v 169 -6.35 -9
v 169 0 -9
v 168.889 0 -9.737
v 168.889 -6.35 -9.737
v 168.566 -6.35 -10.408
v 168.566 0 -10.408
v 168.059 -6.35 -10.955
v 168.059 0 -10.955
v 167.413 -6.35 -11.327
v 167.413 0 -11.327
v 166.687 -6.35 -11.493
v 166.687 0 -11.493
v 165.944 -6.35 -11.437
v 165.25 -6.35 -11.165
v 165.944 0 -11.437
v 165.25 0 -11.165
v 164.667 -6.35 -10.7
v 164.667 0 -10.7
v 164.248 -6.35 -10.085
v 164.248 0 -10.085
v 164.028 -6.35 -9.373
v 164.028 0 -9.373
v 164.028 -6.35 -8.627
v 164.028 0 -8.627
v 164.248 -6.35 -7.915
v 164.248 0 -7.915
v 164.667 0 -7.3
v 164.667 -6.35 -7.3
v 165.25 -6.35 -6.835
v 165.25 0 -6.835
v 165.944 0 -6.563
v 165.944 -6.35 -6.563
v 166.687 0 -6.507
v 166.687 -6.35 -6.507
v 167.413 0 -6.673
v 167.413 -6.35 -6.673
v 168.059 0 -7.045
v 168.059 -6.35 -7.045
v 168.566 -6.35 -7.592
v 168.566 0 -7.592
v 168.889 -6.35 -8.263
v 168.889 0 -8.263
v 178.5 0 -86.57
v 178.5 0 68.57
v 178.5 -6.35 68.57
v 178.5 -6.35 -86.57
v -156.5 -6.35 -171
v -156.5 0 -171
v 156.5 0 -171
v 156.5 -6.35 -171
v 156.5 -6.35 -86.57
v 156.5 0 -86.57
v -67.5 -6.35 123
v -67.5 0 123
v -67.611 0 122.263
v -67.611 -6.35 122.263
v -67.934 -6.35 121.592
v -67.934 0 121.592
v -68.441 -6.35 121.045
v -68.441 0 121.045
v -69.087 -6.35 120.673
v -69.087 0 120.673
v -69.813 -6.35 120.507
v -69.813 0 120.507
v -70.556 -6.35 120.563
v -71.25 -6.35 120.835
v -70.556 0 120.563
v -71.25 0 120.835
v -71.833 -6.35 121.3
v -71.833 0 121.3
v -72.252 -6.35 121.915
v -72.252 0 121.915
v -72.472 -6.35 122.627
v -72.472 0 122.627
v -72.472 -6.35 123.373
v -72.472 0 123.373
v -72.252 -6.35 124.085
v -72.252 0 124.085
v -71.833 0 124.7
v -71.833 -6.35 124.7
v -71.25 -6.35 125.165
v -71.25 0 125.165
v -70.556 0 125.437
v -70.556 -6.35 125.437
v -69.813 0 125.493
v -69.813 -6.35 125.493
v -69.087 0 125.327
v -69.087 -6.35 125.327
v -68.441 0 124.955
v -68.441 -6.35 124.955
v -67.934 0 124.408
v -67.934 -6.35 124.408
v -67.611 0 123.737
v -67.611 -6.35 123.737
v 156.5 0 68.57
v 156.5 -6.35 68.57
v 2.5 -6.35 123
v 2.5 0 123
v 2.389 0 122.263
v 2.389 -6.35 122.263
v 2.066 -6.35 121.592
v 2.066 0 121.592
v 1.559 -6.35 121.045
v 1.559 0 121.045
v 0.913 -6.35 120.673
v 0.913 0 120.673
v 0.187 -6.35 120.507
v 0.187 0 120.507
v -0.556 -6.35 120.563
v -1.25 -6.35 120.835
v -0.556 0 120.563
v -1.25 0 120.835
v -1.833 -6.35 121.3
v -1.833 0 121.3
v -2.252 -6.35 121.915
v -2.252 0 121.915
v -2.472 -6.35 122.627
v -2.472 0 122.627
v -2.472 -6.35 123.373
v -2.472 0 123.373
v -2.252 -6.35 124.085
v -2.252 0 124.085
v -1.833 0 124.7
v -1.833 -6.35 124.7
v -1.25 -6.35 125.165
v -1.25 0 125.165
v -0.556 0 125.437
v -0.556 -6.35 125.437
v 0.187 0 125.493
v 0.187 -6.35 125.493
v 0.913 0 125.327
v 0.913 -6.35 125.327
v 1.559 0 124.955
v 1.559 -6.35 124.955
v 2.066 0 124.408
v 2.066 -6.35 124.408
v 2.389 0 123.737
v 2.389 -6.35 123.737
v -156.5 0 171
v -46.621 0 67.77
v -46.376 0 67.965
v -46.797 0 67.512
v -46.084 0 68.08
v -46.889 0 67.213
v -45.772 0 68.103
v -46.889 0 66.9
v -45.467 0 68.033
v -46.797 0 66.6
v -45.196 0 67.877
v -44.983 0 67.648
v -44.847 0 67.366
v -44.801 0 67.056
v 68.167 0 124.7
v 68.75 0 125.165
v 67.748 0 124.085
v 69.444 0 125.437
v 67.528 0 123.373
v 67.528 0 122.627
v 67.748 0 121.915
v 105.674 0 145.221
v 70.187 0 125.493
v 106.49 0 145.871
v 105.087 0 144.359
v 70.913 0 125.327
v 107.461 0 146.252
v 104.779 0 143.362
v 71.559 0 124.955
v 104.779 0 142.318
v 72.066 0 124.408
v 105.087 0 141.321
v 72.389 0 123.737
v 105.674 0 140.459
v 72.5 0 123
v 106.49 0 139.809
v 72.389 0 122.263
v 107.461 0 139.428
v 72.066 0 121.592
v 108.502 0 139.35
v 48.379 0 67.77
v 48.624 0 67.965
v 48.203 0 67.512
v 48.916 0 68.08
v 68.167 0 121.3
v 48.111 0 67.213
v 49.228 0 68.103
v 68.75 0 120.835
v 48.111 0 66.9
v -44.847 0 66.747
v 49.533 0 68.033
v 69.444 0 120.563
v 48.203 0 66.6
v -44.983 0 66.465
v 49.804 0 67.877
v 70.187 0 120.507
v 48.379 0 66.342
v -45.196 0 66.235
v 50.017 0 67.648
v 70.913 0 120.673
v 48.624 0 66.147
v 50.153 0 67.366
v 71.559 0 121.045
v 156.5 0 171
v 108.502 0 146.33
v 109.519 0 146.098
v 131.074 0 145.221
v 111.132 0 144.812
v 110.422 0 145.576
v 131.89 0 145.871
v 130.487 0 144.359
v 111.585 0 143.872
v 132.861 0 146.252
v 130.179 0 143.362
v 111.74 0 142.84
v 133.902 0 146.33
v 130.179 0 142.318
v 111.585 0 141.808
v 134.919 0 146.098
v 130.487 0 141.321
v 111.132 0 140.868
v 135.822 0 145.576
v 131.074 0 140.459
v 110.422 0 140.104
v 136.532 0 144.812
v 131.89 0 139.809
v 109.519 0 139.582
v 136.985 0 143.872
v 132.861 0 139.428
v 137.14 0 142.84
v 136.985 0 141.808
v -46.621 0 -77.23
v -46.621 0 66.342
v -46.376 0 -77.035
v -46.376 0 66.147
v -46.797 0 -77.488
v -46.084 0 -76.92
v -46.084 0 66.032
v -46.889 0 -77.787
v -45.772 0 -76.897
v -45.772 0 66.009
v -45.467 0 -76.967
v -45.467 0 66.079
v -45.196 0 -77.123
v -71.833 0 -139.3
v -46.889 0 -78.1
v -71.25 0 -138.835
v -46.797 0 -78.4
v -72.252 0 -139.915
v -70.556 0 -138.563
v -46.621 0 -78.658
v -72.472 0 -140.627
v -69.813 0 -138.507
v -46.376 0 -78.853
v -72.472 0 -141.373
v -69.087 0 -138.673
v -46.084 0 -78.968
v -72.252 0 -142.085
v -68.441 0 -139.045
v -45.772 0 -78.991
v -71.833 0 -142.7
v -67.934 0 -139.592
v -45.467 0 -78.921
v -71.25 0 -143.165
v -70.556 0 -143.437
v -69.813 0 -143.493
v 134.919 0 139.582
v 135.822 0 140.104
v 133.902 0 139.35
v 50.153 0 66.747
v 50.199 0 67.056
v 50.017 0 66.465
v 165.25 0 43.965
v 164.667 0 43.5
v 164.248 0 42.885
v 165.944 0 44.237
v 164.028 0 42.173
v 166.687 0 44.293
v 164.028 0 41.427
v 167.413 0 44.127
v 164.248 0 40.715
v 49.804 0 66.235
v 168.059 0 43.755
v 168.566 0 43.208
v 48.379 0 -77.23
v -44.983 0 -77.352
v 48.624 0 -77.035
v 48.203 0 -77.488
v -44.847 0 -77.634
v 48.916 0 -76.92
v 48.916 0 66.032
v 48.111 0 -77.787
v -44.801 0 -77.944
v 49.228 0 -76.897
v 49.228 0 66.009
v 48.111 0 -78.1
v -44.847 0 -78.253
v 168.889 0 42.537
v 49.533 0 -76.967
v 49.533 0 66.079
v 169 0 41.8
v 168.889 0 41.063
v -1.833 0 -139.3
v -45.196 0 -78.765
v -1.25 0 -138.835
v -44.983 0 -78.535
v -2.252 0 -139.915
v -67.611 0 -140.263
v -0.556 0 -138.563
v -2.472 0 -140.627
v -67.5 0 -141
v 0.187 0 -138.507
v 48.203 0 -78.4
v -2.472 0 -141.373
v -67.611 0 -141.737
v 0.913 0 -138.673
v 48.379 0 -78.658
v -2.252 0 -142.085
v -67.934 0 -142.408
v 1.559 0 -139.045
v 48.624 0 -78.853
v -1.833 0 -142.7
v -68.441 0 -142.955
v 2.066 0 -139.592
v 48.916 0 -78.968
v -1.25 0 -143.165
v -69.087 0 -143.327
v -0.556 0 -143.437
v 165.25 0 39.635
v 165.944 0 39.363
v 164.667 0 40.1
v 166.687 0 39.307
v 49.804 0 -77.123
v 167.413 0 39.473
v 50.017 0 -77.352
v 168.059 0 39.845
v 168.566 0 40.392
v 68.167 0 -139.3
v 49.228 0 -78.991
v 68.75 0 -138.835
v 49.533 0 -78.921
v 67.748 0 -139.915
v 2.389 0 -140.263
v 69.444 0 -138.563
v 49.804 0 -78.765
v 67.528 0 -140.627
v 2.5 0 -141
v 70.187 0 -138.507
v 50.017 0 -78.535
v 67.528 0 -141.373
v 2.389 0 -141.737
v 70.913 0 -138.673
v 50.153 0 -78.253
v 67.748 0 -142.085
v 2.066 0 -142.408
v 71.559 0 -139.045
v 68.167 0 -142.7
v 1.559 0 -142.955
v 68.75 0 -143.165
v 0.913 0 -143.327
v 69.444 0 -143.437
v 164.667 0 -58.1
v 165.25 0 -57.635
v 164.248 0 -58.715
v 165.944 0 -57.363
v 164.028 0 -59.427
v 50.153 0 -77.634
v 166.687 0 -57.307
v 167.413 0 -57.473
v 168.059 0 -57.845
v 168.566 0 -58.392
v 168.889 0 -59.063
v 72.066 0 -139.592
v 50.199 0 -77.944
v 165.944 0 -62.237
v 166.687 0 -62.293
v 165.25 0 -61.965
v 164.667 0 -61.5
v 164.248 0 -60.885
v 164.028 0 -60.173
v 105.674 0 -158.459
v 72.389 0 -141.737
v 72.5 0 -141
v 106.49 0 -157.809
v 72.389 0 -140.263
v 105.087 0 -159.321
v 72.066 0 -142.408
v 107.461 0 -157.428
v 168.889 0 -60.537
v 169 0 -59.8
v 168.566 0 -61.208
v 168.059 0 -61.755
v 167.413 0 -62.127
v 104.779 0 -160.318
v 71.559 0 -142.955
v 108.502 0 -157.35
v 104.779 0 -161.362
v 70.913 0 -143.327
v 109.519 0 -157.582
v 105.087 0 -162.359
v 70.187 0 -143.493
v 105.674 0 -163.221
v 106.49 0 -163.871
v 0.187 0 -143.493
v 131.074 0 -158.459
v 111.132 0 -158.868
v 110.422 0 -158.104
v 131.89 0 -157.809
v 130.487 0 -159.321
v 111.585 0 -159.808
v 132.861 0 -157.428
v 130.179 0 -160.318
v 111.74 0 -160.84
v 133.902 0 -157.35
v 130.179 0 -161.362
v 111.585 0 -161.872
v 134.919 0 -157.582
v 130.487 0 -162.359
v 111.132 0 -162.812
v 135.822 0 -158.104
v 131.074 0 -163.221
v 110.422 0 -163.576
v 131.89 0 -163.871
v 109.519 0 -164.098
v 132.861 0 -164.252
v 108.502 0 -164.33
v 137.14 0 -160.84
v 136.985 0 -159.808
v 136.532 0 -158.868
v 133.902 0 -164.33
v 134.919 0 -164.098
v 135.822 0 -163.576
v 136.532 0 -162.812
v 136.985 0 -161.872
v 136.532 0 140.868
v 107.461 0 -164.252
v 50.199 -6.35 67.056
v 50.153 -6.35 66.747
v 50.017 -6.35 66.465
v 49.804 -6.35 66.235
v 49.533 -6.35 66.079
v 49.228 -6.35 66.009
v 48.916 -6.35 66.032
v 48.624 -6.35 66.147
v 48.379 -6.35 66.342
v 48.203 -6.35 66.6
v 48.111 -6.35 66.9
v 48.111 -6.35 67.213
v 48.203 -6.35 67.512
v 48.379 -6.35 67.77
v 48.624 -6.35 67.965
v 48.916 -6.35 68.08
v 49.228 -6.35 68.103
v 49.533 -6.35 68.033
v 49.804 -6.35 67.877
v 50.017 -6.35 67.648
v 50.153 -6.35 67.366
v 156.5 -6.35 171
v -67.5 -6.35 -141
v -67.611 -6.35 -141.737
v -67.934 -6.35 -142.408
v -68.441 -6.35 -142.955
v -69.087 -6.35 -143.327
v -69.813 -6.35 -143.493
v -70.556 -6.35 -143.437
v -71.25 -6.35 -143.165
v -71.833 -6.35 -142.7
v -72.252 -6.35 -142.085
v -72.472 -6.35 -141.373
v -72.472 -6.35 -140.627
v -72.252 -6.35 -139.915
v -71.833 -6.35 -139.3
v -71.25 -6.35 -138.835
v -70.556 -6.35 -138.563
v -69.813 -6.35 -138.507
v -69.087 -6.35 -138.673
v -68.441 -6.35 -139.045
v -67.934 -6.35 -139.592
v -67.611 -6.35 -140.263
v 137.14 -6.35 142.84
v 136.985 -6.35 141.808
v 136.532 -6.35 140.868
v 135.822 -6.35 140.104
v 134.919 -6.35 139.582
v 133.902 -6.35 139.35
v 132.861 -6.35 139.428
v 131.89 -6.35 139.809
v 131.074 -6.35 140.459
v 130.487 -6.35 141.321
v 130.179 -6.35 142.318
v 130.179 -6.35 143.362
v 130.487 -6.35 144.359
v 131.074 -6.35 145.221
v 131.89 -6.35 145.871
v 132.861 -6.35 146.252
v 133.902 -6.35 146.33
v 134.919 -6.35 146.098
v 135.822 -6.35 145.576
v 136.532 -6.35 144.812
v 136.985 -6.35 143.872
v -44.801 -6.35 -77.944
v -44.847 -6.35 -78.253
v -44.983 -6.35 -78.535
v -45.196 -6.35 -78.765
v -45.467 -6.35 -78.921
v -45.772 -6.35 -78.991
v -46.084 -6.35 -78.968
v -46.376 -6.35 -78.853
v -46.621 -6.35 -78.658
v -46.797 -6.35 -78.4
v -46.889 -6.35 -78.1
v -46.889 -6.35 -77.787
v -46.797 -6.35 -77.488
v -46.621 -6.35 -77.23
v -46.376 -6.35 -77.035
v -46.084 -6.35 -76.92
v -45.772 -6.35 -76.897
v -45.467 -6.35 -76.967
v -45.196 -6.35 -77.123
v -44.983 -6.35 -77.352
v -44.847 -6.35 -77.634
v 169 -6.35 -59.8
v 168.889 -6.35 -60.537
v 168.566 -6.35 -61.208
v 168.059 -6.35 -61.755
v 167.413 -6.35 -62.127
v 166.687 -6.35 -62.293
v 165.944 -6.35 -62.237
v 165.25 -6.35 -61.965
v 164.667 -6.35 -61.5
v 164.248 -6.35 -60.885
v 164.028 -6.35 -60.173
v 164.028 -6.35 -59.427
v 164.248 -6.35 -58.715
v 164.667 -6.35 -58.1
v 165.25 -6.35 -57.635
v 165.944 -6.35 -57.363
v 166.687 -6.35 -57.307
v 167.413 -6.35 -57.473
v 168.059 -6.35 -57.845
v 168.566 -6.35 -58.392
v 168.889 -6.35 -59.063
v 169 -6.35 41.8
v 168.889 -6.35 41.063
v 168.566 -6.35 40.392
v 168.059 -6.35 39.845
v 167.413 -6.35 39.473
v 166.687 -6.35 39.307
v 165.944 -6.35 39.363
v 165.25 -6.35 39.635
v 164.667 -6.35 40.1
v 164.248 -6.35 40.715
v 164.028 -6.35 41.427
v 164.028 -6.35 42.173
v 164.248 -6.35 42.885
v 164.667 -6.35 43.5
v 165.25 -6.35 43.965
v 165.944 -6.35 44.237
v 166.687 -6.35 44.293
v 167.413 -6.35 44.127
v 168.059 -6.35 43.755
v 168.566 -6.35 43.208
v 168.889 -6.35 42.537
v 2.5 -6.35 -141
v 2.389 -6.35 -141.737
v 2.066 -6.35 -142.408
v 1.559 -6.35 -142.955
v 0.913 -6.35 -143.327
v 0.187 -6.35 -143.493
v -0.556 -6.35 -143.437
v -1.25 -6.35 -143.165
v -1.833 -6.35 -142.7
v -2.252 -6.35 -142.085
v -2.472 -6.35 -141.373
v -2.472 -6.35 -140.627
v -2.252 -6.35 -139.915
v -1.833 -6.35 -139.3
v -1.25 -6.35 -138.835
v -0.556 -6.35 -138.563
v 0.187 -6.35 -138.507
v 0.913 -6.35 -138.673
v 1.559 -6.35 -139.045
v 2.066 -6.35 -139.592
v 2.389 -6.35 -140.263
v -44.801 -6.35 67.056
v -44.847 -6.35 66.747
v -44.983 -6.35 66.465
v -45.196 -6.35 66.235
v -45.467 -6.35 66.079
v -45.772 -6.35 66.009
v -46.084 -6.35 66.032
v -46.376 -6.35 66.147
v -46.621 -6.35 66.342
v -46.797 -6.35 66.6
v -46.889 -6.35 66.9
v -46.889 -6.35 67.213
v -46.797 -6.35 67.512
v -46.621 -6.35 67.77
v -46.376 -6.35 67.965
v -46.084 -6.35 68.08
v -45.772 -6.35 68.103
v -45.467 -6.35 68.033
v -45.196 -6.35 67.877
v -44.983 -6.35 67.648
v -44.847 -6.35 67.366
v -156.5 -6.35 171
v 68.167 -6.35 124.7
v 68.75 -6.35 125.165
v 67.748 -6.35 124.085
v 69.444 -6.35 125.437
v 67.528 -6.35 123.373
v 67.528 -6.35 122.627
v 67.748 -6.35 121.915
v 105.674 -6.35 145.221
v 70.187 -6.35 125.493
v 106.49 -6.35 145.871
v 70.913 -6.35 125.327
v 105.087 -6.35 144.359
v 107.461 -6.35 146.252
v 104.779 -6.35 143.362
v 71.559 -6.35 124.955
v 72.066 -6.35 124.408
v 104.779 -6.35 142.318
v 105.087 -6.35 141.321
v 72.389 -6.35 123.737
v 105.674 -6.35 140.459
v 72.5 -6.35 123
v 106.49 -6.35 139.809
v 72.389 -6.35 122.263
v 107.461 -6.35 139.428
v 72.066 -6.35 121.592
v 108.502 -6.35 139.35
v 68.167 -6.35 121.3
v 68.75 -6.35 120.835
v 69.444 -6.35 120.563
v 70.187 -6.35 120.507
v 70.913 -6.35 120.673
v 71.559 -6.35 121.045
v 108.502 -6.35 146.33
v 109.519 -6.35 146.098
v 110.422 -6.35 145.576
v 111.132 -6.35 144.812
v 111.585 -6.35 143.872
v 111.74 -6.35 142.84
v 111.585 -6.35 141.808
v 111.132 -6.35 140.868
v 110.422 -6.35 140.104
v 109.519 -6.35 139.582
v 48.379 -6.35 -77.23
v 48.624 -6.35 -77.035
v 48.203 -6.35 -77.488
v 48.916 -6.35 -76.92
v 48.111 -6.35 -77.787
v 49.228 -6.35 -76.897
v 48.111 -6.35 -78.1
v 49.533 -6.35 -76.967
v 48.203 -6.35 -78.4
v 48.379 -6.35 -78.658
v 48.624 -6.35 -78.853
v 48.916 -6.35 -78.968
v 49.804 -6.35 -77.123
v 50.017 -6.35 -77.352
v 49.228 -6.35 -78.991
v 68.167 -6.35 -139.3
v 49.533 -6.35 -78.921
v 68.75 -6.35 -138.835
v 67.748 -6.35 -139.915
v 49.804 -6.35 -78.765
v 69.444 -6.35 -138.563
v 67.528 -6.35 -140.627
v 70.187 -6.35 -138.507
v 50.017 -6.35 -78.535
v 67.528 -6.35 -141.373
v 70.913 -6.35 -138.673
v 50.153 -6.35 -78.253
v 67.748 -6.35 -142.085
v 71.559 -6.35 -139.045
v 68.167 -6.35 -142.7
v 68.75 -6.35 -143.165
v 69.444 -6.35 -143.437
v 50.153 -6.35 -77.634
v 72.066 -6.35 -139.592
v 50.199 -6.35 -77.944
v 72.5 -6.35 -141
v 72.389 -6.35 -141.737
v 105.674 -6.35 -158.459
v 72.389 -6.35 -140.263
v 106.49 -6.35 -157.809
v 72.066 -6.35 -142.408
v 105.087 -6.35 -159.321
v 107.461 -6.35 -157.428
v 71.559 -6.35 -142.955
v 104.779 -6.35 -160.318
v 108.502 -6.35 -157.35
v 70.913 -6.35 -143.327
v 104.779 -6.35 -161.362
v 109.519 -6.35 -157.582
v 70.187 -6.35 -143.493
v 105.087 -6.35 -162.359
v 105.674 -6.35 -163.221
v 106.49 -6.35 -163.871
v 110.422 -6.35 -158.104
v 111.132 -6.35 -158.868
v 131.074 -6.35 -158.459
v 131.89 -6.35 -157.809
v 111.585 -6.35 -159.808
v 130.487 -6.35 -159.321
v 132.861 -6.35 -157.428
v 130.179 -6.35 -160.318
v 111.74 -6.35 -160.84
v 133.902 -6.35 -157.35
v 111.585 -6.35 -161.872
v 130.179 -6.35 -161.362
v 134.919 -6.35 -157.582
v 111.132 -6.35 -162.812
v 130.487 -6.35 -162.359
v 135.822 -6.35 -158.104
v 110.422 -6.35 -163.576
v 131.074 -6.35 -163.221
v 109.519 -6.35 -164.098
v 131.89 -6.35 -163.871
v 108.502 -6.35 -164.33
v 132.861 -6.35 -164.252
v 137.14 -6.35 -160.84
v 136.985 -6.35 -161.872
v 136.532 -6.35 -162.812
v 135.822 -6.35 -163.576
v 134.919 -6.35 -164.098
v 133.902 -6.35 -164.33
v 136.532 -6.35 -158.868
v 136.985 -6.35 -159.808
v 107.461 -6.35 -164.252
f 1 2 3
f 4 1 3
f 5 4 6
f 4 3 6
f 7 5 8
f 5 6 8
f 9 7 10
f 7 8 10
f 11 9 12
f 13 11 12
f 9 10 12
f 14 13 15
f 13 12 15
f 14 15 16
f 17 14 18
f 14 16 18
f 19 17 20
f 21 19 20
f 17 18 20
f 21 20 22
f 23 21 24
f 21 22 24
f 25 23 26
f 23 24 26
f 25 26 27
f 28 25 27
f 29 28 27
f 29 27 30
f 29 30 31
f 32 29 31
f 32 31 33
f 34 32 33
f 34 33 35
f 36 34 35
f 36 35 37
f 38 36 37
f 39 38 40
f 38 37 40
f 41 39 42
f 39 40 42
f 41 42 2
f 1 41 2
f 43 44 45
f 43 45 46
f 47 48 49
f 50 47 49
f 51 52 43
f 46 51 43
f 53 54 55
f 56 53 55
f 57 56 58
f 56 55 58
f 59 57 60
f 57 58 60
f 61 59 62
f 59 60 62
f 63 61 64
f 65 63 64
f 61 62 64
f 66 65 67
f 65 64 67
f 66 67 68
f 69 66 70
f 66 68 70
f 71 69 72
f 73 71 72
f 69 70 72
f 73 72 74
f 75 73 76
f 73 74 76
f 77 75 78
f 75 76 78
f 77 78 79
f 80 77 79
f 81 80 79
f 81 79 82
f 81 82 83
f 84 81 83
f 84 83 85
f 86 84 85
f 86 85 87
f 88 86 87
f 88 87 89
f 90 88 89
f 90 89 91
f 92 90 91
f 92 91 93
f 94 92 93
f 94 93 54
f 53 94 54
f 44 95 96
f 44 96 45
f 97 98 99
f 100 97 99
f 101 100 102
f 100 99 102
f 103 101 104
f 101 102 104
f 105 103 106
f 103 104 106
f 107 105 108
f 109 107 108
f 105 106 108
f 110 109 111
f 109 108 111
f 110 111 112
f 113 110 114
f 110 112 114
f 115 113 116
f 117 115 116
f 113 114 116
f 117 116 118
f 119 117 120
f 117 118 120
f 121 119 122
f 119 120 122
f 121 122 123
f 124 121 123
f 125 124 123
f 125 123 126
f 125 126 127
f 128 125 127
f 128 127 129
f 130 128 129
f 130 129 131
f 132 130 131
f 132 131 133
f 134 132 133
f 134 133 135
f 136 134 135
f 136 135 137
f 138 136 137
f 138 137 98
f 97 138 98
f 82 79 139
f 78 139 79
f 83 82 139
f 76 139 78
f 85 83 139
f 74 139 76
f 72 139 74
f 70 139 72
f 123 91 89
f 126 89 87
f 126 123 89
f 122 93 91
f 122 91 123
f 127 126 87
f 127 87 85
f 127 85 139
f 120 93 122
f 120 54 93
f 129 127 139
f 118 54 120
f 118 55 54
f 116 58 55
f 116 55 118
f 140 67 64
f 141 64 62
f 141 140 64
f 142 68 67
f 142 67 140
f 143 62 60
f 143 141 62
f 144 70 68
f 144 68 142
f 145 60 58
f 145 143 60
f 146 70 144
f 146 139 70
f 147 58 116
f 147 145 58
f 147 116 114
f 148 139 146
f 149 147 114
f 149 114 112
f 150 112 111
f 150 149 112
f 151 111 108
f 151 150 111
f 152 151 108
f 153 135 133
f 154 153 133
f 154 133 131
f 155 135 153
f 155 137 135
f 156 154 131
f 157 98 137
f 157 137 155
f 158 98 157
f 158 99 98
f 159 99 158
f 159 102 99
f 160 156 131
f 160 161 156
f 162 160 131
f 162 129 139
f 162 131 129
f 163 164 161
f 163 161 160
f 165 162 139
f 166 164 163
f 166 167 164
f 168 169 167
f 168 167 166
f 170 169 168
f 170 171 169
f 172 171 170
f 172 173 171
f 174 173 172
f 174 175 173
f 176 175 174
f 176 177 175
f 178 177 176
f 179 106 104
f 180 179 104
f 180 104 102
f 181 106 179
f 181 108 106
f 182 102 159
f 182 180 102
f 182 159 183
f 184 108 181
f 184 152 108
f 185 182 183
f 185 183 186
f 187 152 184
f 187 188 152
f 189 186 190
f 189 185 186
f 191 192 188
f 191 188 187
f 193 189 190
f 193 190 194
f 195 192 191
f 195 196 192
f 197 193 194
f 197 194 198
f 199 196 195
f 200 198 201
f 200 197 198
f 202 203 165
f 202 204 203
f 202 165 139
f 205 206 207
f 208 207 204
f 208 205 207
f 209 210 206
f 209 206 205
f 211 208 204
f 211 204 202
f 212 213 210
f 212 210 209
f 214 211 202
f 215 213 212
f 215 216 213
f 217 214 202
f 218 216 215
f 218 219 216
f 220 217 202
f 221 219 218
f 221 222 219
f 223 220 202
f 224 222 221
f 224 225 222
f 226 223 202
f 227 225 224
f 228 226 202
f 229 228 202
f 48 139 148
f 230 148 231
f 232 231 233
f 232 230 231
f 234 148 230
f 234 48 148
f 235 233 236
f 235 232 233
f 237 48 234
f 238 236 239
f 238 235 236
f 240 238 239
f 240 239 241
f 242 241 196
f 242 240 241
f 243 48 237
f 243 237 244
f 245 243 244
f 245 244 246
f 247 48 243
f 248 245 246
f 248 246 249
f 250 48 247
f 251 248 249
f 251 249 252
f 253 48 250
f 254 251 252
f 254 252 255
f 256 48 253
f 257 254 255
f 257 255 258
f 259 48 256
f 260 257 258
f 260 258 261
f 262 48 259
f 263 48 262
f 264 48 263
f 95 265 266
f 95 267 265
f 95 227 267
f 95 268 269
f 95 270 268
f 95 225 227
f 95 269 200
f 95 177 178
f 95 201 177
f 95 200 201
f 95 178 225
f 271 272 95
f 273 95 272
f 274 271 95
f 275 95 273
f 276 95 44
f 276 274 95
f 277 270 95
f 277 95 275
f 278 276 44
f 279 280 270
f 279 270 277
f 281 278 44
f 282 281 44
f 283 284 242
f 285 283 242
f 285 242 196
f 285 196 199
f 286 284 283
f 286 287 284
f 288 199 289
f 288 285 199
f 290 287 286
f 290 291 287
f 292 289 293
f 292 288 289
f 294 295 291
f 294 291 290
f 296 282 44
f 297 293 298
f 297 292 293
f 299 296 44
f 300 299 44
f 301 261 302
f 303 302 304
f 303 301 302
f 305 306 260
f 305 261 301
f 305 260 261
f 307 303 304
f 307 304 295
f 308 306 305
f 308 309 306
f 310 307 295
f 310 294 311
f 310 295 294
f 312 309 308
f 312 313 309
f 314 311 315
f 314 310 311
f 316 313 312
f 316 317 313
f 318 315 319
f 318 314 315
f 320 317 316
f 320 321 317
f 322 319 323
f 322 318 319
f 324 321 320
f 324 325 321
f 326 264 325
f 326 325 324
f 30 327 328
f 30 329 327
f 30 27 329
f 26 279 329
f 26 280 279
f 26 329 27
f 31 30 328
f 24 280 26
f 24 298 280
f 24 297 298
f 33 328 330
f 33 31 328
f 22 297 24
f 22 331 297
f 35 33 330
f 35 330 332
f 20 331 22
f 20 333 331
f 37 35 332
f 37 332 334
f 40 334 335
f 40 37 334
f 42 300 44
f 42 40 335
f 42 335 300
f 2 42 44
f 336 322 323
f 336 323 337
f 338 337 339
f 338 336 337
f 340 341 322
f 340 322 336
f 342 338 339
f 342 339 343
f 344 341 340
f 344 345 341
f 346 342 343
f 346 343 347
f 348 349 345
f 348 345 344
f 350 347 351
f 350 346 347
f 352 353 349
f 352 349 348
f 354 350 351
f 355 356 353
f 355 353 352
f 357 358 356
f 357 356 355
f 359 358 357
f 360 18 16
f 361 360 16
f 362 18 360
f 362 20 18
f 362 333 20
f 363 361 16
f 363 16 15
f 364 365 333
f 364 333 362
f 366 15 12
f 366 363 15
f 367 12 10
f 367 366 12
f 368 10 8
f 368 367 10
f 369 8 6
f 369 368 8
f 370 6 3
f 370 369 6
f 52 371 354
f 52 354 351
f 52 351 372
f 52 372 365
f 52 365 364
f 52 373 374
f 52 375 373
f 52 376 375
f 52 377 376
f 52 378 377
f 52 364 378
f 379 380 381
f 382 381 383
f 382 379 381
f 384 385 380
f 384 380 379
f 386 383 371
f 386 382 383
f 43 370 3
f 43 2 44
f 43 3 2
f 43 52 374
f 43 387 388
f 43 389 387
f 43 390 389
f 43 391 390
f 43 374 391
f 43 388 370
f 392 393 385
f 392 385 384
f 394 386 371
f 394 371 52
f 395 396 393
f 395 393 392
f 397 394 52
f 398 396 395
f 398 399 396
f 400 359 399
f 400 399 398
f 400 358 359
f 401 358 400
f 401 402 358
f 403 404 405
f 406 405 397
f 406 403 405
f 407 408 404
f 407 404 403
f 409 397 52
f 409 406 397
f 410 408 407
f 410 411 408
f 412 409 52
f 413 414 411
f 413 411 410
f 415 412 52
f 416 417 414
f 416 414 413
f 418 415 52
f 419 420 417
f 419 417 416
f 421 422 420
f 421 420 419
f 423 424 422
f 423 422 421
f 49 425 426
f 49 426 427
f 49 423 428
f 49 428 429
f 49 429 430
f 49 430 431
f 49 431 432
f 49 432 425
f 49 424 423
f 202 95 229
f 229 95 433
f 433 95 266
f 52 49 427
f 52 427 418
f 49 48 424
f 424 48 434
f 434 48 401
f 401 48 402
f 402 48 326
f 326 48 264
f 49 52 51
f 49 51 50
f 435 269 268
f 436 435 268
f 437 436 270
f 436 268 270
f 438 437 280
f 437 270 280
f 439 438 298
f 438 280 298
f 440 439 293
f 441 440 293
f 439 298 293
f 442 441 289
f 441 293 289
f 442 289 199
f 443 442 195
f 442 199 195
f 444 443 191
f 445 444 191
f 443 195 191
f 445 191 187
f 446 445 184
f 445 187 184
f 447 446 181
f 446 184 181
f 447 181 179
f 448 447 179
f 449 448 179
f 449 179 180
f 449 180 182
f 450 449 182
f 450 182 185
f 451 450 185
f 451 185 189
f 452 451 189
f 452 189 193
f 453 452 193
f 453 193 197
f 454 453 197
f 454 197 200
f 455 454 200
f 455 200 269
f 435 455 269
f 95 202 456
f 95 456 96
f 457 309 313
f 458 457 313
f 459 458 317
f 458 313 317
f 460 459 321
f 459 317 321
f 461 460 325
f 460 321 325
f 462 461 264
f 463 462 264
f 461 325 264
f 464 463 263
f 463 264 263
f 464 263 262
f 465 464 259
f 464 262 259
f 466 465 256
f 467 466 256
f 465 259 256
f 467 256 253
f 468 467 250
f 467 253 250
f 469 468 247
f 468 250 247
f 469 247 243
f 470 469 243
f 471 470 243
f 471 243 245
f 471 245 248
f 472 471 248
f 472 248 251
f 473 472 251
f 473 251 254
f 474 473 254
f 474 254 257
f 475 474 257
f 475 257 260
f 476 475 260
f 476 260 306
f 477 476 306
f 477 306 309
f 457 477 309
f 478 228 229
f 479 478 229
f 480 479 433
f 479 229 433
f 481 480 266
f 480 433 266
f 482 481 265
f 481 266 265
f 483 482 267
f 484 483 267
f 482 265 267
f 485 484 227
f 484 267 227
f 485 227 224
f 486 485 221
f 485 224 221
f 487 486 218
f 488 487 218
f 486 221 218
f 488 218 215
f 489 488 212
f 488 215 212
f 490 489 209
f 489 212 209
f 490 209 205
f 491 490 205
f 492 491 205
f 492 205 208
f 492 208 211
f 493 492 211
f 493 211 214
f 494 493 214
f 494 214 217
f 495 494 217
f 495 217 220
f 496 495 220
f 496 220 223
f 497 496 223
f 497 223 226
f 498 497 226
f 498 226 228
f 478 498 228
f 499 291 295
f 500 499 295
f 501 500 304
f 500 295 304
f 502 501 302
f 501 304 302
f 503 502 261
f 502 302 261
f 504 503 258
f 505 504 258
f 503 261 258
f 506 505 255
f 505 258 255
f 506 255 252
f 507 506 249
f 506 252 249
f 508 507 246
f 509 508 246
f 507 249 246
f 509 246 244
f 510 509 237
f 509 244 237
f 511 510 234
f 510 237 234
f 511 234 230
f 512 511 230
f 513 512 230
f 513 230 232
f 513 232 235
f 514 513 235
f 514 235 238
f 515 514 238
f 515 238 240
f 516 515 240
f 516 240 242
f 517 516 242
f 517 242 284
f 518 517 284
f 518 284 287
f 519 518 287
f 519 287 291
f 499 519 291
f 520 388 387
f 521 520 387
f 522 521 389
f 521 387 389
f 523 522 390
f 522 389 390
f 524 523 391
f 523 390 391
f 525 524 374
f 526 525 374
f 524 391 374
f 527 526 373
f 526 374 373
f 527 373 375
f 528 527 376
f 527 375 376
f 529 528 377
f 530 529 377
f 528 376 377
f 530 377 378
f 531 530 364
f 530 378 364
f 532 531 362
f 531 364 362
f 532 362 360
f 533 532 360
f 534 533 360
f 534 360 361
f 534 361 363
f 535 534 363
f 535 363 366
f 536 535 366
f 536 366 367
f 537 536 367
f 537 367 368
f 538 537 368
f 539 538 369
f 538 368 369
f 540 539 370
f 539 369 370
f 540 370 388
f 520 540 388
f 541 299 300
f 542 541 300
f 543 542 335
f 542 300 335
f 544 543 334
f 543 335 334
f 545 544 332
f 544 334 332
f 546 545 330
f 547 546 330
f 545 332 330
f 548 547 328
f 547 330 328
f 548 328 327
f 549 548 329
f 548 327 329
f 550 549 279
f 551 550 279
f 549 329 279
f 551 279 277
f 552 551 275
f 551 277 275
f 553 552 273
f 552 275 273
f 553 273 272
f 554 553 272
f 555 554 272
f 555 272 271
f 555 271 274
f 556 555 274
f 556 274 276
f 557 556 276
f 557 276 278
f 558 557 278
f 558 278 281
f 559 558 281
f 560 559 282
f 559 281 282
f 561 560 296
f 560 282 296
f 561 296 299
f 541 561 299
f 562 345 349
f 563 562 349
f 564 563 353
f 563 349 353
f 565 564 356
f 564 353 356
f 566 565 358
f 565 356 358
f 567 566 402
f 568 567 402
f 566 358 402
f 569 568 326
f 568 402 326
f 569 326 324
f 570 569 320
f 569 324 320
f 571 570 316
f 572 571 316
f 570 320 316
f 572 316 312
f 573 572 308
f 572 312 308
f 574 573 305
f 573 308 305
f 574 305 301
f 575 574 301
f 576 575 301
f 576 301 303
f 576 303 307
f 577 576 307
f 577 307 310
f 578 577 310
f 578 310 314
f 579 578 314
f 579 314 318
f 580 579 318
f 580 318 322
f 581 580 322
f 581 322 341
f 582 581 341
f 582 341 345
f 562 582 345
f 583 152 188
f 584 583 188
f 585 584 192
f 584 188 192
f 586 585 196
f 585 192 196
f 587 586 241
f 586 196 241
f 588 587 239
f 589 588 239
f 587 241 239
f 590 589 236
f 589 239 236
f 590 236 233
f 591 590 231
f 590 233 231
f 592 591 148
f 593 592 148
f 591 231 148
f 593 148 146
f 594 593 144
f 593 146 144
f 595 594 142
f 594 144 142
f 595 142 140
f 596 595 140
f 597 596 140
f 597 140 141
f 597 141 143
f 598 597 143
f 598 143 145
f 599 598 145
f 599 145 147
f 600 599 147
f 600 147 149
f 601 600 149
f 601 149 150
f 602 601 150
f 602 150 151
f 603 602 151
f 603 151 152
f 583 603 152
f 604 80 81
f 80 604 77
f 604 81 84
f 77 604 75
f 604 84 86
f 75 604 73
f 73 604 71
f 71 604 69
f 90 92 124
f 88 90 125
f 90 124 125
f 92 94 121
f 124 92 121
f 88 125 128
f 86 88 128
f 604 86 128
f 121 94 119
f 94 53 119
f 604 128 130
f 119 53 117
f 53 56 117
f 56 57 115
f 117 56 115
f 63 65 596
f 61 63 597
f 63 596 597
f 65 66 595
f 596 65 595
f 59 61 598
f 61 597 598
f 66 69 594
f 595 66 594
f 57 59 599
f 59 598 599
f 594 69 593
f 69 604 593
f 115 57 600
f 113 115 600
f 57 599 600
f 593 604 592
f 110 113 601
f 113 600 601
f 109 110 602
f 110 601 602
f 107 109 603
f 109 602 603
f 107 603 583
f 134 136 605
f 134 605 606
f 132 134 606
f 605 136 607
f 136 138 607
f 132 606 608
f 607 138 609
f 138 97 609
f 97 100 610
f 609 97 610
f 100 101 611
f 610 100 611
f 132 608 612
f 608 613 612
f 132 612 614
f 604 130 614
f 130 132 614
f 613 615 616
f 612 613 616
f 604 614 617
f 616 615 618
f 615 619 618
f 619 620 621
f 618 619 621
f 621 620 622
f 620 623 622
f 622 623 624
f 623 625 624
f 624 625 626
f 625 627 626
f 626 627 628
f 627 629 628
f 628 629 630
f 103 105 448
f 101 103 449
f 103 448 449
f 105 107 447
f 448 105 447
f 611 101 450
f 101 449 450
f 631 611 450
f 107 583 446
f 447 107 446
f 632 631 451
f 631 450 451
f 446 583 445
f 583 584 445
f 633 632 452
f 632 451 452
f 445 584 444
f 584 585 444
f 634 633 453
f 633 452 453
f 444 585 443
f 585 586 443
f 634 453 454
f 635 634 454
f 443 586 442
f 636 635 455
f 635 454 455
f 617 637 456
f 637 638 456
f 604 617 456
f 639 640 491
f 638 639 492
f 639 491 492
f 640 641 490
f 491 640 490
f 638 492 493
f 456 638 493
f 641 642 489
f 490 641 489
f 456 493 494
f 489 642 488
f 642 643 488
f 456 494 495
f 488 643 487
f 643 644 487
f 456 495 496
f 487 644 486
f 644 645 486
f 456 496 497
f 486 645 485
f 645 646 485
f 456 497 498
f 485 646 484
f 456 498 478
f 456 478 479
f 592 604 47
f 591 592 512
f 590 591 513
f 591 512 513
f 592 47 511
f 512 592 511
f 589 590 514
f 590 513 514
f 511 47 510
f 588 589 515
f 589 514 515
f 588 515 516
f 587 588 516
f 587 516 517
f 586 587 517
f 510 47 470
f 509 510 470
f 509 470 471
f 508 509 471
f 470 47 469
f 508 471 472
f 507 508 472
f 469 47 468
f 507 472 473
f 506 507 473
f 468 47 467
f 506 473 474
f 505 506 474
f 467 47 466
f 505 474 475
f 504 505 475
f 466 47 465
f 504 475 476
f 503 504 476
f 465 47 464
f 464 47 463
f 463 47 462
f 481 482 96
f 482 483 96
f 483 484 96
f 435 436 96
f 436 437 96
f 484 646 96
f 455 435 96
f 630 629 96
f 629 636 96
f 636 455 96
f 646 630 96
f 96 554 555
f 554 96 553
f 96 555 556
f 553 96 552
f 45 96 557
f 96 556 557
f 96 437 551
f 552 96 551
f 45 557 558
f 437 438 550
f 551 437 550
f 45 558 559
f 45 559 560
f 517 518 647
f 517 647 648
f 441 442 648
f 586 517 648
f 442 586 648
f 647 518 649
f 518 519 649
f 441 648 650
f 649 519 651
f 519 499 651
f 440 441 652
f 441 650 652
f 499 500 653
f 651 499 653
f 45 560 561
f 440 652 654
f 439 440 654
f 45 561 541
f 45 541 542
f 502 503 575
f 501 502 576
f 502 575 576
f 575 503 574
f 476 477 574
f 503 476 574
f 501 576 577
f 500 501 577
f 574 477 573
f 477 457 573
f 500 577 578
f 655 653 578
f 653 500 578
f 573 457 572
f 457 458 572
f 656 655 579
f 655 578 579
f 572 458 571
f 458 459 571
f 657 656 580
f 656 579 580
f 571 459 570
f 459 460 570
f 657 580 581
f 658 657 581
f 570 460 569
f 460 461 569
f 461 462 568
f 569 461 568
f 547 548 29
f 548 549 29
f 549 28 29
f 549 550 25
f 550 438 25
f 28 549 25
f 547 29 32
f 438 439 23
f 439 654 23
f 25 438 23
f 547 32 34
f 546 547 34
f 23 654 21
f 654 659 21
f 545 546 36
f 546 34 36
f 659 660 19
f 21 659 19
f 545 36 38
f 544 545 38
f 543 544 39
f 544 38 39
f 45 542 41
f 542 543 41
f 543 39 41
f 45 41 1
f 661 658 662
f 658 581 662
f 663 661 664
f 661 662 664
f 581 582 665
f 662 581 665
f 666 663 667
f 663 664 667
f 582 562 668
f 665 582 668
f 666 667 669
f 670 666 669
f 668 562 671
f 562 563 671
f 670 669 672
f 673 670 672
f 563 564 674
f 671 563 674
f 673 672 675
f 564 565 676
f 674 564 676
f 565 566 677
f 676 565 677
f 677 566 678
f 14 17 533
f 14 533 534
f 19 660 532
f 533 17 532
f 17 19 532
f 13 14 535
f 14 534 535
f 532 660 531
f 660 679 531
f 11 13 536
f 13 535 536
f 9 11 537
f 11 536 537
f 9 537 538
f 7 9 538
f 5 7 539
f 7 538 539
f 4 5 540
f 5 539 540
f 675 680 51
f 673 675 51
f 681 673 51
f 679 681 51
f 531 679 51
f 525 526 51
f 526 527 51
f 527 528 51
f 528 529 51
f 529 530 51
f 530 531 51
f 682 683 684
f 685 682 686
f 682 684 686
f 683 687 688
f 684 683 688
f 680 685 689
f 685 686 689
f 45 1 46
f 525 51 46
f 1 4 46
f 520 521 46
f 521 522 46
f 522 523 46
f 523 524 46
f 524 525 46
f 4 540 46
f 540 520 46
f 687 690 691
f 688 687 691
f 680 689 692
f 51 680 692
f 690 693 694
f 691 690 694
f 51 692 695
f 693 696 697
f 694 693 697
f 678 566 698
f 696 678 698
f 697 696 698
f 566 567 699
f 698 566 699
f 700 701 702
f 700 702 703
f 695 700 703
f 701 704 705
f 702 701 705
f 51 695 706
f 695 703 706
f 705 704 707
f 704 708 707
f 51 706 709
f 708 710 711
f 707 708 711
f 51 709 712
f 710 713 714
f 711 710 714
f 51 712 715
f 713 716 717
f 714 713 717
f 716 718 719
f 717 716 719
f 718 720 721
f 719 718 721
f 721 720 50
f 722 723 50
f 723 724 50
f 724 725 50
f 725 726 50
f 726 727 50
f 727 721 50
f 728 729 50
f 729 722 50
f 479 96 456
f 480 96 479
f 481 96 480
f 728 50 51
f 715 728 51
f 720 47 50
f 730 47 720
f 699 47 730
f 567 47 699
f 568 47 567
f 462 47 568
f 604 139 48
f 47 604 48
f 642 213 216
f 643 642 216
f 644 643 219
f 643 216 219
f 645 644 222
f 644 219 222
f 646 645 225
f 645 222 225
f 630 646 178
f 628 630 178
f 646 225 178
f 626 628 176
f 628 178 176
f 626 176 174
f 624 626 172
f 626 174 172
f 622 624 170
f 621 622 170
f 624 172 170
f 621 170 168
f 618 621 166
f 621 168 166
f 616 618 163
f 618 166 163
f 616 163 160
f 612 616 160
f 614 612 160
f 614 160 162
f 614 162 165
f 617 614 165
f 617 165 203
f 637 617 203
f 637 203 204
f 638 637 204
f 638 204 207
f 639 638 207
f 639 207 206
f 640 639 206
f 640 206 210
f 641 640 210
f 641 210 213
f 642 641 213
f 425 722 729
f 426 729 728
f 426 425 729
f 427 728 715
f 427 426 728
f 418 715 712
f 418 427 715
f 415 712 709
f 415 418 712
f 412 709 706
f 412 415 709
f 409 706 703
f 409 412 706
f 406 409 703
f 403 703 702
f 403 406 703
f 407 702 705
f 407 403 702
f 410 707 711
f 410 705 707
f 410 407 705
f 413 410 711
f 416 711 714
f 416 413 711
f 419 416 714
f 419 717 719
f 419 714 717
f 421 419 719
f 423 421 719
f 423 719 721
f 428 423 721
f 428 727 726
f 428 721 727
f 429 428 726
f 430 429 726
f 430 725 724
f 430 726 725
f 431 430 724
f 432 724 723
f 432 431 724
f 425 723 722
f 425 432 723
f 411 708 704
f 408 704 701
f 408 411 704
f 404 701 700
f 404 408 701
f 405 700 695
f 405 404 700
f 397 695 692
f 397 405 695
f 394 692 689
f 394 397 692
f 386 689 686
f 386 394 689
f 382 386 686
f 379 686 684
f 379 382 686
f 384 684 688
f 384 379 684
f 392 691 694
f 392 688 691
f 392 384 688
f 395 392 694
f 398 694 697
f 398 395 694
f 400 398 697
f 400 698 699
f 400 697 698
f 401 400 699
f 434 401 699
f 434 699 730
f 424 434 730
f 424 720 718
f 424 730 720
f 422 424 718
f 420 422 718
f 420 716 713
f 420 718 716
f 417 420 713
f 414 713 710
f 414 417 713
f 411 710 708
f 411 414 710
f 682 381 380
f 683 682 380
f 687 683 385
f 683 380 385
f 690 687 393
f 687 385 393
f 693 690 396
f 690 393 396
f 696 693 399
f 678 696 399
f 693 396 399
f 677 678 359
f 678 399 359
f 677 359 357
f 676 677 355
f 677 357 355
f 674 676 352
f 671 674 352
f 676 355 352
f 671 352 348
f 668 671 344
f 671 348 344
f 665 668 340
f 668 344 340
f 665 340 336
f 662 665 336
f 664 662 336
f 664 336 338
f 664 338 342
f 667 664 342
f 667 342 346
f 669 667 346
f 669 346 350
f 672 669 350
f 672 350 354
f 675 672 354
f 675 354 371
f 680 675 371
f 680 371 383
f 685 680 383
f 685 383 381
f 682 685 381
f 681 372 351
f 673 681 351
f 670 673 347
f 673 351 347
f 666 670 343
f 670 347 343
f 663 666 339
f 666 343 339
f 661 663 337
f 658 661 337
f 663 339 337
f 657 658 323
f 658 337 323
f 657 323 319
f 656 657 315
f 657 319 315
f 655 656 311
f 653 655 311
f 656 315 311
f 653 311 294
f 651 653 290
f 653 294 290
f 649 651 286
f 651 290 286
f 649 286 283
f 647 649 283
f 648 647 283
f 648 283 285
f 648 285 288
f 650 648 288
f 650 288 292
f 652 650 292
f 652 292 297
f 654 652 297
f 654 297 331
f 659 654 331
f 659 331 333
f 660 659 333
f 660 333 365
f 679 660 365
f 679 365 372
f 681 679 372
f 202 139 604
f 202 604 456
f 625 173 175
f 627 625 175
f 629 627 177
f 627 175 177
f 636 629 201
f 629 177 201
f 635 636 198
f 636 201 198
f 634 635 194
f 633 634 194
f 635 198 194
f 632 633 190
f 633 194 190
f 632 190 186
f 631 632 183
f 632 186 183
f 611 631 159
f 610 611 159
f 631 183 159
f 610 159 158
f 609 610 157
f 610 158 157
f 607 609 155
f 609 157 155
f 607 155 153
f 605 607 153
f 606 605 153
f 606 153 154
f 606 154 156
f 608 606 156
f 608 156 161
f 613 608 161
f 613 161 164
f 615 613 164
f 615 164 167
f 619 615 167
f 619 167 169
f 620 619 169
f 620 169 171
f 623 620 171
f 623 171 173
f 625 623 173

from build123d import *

# Parameters (mm, degrees)
SKETCH1_W           = 313
SKETCH1_H           = 342
BOSS_EXTRUDE1_DEPTH = 6.35
SKETCH3_W           = 22
SKETCH3_H           = 155.14040353
SKETCH3_R           = 2.5
BOSS_EXTRUDE2_DEPTH = 6.35
SKETCH2_R           = 2.5
CUT_EXTRUDE1_DEPTH  = 7.35
SKETCH4_R           = 3.5
CUT_EXTRUDE2_DEPTH  = 7.35
SKETCH5_R           = 1.05
CUT_EXTRUDE3_DEPTH  = 7.35


with BuildPart() as part:
    # Sketch1 → Boss-Extrude1 (new body)
    with BuildSketch(Plane(origin=(0, 0, 0), x_dir=(1, 0, 0), z_dir=(0, 1, 0))):
        Rectangle(SKETCH1_W, SKETCH1_H)
    extrude(amount=-BOSS_EXTRUDE1_DEPTH)

    # Sketch3 → Boss-Extrude2 (add)
    with BuildSketch(Plane(origin=(0, 0, 0), x_dir=(1, 0, 0), z_dir=(0, 1, 0))):
        with Locations((167.5, 9)):
            Rectangle(SKETCH3_W, SKETCH3_H)
        with Locations((166.5, 9)):
            Circle(SKETCH3_R, mode=Mode.SUBTRACT)
        with Locations((166.5, -41.8)):
            Circle(SKETCH3_R, mode=Mode.SUBTRACT)
        with Locations((166.5, 59.8)):
            Circle(SKETCH3_R, mode=Mode.SUBTRACT)
    extrude(amount=-BOSS_EXTRUDE2_DEPTH)

    # Sketch2 → Cut-Extrude1 (cut, through all)
    with BuildSketch(Plane(origin=(0, 0, 0), x_dir=(1, 0, 0), z_dir=(0, 1, 0))):
        with Locations((0, -123)):
            Circle(SKETCH2_R)
        with Locations((-70, -123)):
            Circle(SKETCH2_R)
        with Locations((70, -123)):
            Circle(SKETCH2_R)
        with Locations((-70, 141)):
            Circle(SKETCH2_R)
        with Locations((0, 141)):
            Circle(SKETCH2_R)
        with Locations((70, 141)):
            Circle(SKETCH2_R)
    extrude(amount=-CUT_EXTRUDE1_DEPTH, mode=Mode.SUBTRACT)

    # Sketch4 → Cut-Extrude2 (cut, through all)
    with BuildSketch(Plane(origin=(0, 0, 0), x_dir=(1, 0, 0), z_dir=(0, 1, 0))):
        with Locations((133.64, -142.84)):
            Circle(SKETCH4_R)
        with Locations((108.24, -142.84)):
            Circle(SKETCH4_R)
    cut_extrude2 = extrude(amount=-CUT_EXTRUDE2_DEPTH, mode=Mode.SUBTRACT)

    # Mirror1: Cut-Extrude2 across plane
    add(cut_extrude2.mirror(Plane(origin=(0, 0, -9), x_dir=(1, 0, 0), z_dir=(0, 0, -1))), mode=Mode.SUBTRACT)

    # Sketch5 → Cut-Extrude3 (cut, through all)
    with BuildSketch(Plane(origin=(0, 0, 0), x_dir=(1, 0, 0), z_dir=(0, 1, 0))):
        with Locations((49.149172759, 77.943976756)):
            Circle(SKETCH5_R)
        with Locations((49.149172759, -67.056023244)):
            Circle(SKETCH5_R)
        with Locations((-45.850827241, 77.943976756)):
            Circle(SKETCH5_R)
        with Locations((-45.850827241, -67.056023244)):
            Circle(SKETCH5_R)
    extrude(amount=-CUT_EXTRUDE3_DEPTH, mode=Mode.SUBTRACT)


solid = part.part
